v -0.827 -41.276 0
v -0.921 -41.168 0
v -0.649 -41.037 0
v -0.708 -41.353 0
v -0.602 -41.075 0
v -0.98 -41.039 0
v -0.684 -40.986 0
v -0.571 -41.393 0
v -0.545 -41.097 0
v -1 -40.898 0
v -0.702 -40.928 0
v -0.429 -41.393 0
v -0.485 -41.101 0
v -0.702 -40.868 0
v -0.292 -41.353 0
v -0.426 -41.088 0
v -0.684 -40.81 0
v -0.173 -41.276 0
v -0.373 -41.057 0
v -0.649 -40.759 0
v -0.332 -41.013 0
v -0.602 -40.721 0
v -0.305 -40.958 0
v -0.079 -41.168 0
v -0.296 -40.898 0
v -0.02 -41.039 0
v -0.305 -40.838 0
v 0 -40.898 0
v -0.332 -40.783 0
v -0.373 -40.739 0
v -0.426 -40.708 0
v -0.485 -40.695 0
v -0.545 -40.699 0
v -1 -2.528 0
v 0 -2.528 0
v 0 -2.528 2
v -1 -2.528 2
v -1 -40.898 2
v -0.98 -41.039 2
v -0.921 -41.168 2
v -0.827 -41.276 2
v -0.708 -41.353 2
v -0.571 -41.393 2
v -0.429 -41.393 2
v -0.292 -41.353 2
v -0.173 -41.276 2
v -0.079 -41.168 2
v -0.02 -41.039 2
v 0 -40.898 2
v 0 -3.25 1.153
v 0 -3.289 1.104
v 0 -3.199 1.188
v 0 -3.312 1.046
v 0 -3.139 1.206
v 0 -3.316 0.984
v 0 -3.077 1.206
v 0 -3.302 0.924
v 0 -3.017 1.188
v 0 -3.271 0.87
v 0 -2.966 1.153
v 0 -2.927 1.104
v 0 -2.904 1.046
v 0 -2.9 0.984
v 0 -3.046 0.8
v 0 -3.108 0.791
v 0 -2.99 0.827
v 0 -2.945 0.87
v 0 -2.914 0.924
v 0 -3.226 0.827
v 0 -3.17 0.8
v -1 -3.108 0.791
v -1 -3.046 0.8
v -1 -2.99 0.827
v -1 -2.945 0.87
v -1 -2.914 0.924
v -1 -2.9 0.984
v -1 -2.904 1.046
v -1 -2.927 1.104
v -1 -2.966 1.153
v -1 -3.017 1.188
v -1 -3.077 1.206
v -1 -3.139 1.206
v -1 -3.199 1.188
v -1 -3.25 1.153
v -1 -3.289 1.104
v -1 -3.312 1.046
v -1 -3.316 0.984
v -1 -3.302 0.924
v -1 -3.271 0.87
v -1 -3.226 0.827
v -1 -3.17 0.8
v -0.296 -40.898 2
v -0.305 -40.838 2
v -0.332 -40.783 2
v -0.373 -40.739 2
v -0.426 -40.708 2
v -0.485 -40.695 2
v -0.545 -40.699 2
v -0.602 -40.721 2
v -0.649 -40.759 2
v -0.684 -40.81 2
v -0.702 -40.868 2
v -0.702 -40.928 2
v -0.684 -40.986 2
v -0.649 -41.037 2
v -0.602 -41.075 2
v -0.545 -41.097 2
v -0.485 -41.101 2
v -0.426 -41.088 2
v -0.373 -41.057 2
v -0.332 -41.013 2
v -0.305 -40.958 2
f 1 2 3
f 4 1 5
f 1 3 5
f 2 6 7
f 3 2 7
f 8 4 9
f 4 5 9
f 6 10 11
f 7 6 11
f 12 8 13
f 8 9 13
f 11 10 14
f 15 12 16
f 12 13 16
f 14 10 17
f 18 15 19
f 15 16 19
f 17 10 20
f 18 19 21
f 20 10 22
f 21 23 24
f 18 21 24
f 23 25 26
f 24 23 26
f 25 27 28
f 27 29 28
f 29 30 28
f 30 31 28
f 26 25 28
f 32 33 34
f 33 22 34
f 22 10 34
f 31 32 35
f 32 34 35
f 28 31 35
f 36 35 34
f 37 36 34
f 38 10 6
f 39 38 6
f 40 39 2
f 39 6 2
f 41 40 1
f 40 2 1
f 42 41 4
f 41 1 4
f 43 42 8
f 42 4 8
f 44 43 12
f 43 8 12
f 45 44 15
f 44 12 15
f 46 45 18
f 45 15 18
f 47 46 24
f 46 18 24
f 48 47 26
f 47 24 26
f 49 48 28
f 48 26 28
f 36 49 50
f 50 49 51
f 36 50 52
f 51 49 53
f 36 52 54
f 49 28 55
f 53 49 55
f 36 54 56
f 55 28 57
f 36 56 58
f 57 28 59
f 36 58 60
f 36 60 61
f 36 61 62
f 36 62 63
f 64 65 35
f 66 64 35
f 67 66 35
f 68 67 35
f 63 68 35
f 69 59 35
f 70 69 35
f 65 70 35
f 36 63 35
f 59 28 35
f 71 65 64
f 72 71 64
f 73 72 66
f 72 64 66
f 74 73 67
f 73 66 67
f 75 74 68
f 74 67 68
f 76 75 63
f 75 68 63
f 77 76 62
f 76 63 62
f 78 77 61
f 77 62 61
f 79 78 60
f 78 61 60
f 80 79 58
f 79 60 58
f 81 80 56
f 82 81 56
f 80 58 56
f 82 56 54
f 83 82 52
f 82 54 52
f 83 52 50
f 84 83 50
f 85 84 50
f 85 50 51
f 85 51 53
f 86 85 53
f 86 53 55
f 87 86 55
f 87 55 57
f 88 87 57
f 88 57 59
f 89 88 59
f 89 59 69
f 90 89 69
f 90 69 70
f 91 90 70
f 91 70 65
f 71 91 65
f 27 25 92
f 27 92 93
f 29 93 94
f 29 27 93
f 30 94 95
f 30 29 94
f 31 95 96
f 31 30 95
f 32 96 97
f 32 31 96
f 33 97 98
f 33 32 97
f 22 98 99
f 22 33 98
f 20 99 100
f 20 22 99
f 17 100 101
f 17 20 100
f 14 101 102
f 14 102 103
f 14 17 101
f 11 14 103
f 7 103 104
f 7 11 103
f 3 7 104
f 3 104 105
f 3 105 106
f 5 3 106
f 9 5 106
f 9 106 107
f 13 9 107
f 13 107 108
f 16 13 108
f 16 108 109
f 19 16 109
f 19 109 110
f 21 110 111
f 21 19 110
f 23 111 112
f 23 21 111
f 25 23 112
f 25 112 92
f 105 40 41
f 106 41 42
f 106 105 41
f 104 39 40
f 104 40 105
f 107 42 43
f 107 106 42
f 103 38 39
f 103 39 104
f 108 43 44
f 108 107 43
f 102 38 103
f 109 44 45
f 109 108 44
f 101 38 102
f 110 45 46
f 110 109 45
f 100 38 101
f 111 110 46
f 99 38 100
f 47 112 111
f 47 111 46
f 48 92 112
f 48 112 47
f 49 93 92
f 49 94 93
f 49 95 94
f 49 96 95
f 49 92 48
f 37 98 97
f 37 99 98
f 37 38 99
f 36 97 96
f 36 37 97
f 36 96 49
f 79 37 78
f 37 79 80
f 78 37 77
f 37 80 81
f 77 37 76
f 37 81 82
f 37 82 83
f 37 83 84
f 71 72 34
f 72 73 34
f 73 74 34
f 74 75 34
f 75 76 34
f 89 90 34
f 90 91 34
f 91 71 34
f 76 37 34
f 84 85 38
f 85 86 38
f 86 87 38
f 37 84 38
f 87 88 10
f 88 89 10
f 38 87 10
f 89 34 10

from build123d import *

# Parameters (mm, degrees)
SKETCH5_R           = 0.203870929
BOSS_EXTRUDE2_DEPTH = 2
SKETCH7_R           = 0.208826812
CUT_EXTRUDE5_DEPTH  = 2


with BuildPart() as part:
    # Sketch5 → Boss-Extrude2 (new body)
    with BuildSketch(Plane.XY):
        with BuildLine():
            Line((-1, -3.107995304), (-1, -40.897995304))
            ThreePointArc((-1, -40.897995304), (-0.5, -41.397995304), (0, -40.897995304))
            Line((0, -40.897995304), (0, -3.107995304))
            Line((0, -3.107995304), (0, -2.527995304))
            Line((0, -2.527995304), (-1, -2.527995304))
            Line((-1, -2.527995304), (-1, -3.107995304))
        make_face()
        with Locations((-0.5, -40.897995304)):
            Circle(SKETCH5_R, mode=Mode.SUBTRACT)
    extrude(amount=BOSS_EXTRUDE2_DEPTH)

    # Sketch7 → Cut-Extrude5 (cut, through all)
    with BuildSketch(Plane(origin=(0, 0, 0), x_dir=(0, 0, -1), z_dir=(1, 0, 0))):
        with Locations((-1, -3.107995304)):
            Circle(SKETCH7_R)
    extrude(amount=-CUT_EXTRUDE5_DEPTH, mode=Mode.SUBTRACT)


solid = part.part
